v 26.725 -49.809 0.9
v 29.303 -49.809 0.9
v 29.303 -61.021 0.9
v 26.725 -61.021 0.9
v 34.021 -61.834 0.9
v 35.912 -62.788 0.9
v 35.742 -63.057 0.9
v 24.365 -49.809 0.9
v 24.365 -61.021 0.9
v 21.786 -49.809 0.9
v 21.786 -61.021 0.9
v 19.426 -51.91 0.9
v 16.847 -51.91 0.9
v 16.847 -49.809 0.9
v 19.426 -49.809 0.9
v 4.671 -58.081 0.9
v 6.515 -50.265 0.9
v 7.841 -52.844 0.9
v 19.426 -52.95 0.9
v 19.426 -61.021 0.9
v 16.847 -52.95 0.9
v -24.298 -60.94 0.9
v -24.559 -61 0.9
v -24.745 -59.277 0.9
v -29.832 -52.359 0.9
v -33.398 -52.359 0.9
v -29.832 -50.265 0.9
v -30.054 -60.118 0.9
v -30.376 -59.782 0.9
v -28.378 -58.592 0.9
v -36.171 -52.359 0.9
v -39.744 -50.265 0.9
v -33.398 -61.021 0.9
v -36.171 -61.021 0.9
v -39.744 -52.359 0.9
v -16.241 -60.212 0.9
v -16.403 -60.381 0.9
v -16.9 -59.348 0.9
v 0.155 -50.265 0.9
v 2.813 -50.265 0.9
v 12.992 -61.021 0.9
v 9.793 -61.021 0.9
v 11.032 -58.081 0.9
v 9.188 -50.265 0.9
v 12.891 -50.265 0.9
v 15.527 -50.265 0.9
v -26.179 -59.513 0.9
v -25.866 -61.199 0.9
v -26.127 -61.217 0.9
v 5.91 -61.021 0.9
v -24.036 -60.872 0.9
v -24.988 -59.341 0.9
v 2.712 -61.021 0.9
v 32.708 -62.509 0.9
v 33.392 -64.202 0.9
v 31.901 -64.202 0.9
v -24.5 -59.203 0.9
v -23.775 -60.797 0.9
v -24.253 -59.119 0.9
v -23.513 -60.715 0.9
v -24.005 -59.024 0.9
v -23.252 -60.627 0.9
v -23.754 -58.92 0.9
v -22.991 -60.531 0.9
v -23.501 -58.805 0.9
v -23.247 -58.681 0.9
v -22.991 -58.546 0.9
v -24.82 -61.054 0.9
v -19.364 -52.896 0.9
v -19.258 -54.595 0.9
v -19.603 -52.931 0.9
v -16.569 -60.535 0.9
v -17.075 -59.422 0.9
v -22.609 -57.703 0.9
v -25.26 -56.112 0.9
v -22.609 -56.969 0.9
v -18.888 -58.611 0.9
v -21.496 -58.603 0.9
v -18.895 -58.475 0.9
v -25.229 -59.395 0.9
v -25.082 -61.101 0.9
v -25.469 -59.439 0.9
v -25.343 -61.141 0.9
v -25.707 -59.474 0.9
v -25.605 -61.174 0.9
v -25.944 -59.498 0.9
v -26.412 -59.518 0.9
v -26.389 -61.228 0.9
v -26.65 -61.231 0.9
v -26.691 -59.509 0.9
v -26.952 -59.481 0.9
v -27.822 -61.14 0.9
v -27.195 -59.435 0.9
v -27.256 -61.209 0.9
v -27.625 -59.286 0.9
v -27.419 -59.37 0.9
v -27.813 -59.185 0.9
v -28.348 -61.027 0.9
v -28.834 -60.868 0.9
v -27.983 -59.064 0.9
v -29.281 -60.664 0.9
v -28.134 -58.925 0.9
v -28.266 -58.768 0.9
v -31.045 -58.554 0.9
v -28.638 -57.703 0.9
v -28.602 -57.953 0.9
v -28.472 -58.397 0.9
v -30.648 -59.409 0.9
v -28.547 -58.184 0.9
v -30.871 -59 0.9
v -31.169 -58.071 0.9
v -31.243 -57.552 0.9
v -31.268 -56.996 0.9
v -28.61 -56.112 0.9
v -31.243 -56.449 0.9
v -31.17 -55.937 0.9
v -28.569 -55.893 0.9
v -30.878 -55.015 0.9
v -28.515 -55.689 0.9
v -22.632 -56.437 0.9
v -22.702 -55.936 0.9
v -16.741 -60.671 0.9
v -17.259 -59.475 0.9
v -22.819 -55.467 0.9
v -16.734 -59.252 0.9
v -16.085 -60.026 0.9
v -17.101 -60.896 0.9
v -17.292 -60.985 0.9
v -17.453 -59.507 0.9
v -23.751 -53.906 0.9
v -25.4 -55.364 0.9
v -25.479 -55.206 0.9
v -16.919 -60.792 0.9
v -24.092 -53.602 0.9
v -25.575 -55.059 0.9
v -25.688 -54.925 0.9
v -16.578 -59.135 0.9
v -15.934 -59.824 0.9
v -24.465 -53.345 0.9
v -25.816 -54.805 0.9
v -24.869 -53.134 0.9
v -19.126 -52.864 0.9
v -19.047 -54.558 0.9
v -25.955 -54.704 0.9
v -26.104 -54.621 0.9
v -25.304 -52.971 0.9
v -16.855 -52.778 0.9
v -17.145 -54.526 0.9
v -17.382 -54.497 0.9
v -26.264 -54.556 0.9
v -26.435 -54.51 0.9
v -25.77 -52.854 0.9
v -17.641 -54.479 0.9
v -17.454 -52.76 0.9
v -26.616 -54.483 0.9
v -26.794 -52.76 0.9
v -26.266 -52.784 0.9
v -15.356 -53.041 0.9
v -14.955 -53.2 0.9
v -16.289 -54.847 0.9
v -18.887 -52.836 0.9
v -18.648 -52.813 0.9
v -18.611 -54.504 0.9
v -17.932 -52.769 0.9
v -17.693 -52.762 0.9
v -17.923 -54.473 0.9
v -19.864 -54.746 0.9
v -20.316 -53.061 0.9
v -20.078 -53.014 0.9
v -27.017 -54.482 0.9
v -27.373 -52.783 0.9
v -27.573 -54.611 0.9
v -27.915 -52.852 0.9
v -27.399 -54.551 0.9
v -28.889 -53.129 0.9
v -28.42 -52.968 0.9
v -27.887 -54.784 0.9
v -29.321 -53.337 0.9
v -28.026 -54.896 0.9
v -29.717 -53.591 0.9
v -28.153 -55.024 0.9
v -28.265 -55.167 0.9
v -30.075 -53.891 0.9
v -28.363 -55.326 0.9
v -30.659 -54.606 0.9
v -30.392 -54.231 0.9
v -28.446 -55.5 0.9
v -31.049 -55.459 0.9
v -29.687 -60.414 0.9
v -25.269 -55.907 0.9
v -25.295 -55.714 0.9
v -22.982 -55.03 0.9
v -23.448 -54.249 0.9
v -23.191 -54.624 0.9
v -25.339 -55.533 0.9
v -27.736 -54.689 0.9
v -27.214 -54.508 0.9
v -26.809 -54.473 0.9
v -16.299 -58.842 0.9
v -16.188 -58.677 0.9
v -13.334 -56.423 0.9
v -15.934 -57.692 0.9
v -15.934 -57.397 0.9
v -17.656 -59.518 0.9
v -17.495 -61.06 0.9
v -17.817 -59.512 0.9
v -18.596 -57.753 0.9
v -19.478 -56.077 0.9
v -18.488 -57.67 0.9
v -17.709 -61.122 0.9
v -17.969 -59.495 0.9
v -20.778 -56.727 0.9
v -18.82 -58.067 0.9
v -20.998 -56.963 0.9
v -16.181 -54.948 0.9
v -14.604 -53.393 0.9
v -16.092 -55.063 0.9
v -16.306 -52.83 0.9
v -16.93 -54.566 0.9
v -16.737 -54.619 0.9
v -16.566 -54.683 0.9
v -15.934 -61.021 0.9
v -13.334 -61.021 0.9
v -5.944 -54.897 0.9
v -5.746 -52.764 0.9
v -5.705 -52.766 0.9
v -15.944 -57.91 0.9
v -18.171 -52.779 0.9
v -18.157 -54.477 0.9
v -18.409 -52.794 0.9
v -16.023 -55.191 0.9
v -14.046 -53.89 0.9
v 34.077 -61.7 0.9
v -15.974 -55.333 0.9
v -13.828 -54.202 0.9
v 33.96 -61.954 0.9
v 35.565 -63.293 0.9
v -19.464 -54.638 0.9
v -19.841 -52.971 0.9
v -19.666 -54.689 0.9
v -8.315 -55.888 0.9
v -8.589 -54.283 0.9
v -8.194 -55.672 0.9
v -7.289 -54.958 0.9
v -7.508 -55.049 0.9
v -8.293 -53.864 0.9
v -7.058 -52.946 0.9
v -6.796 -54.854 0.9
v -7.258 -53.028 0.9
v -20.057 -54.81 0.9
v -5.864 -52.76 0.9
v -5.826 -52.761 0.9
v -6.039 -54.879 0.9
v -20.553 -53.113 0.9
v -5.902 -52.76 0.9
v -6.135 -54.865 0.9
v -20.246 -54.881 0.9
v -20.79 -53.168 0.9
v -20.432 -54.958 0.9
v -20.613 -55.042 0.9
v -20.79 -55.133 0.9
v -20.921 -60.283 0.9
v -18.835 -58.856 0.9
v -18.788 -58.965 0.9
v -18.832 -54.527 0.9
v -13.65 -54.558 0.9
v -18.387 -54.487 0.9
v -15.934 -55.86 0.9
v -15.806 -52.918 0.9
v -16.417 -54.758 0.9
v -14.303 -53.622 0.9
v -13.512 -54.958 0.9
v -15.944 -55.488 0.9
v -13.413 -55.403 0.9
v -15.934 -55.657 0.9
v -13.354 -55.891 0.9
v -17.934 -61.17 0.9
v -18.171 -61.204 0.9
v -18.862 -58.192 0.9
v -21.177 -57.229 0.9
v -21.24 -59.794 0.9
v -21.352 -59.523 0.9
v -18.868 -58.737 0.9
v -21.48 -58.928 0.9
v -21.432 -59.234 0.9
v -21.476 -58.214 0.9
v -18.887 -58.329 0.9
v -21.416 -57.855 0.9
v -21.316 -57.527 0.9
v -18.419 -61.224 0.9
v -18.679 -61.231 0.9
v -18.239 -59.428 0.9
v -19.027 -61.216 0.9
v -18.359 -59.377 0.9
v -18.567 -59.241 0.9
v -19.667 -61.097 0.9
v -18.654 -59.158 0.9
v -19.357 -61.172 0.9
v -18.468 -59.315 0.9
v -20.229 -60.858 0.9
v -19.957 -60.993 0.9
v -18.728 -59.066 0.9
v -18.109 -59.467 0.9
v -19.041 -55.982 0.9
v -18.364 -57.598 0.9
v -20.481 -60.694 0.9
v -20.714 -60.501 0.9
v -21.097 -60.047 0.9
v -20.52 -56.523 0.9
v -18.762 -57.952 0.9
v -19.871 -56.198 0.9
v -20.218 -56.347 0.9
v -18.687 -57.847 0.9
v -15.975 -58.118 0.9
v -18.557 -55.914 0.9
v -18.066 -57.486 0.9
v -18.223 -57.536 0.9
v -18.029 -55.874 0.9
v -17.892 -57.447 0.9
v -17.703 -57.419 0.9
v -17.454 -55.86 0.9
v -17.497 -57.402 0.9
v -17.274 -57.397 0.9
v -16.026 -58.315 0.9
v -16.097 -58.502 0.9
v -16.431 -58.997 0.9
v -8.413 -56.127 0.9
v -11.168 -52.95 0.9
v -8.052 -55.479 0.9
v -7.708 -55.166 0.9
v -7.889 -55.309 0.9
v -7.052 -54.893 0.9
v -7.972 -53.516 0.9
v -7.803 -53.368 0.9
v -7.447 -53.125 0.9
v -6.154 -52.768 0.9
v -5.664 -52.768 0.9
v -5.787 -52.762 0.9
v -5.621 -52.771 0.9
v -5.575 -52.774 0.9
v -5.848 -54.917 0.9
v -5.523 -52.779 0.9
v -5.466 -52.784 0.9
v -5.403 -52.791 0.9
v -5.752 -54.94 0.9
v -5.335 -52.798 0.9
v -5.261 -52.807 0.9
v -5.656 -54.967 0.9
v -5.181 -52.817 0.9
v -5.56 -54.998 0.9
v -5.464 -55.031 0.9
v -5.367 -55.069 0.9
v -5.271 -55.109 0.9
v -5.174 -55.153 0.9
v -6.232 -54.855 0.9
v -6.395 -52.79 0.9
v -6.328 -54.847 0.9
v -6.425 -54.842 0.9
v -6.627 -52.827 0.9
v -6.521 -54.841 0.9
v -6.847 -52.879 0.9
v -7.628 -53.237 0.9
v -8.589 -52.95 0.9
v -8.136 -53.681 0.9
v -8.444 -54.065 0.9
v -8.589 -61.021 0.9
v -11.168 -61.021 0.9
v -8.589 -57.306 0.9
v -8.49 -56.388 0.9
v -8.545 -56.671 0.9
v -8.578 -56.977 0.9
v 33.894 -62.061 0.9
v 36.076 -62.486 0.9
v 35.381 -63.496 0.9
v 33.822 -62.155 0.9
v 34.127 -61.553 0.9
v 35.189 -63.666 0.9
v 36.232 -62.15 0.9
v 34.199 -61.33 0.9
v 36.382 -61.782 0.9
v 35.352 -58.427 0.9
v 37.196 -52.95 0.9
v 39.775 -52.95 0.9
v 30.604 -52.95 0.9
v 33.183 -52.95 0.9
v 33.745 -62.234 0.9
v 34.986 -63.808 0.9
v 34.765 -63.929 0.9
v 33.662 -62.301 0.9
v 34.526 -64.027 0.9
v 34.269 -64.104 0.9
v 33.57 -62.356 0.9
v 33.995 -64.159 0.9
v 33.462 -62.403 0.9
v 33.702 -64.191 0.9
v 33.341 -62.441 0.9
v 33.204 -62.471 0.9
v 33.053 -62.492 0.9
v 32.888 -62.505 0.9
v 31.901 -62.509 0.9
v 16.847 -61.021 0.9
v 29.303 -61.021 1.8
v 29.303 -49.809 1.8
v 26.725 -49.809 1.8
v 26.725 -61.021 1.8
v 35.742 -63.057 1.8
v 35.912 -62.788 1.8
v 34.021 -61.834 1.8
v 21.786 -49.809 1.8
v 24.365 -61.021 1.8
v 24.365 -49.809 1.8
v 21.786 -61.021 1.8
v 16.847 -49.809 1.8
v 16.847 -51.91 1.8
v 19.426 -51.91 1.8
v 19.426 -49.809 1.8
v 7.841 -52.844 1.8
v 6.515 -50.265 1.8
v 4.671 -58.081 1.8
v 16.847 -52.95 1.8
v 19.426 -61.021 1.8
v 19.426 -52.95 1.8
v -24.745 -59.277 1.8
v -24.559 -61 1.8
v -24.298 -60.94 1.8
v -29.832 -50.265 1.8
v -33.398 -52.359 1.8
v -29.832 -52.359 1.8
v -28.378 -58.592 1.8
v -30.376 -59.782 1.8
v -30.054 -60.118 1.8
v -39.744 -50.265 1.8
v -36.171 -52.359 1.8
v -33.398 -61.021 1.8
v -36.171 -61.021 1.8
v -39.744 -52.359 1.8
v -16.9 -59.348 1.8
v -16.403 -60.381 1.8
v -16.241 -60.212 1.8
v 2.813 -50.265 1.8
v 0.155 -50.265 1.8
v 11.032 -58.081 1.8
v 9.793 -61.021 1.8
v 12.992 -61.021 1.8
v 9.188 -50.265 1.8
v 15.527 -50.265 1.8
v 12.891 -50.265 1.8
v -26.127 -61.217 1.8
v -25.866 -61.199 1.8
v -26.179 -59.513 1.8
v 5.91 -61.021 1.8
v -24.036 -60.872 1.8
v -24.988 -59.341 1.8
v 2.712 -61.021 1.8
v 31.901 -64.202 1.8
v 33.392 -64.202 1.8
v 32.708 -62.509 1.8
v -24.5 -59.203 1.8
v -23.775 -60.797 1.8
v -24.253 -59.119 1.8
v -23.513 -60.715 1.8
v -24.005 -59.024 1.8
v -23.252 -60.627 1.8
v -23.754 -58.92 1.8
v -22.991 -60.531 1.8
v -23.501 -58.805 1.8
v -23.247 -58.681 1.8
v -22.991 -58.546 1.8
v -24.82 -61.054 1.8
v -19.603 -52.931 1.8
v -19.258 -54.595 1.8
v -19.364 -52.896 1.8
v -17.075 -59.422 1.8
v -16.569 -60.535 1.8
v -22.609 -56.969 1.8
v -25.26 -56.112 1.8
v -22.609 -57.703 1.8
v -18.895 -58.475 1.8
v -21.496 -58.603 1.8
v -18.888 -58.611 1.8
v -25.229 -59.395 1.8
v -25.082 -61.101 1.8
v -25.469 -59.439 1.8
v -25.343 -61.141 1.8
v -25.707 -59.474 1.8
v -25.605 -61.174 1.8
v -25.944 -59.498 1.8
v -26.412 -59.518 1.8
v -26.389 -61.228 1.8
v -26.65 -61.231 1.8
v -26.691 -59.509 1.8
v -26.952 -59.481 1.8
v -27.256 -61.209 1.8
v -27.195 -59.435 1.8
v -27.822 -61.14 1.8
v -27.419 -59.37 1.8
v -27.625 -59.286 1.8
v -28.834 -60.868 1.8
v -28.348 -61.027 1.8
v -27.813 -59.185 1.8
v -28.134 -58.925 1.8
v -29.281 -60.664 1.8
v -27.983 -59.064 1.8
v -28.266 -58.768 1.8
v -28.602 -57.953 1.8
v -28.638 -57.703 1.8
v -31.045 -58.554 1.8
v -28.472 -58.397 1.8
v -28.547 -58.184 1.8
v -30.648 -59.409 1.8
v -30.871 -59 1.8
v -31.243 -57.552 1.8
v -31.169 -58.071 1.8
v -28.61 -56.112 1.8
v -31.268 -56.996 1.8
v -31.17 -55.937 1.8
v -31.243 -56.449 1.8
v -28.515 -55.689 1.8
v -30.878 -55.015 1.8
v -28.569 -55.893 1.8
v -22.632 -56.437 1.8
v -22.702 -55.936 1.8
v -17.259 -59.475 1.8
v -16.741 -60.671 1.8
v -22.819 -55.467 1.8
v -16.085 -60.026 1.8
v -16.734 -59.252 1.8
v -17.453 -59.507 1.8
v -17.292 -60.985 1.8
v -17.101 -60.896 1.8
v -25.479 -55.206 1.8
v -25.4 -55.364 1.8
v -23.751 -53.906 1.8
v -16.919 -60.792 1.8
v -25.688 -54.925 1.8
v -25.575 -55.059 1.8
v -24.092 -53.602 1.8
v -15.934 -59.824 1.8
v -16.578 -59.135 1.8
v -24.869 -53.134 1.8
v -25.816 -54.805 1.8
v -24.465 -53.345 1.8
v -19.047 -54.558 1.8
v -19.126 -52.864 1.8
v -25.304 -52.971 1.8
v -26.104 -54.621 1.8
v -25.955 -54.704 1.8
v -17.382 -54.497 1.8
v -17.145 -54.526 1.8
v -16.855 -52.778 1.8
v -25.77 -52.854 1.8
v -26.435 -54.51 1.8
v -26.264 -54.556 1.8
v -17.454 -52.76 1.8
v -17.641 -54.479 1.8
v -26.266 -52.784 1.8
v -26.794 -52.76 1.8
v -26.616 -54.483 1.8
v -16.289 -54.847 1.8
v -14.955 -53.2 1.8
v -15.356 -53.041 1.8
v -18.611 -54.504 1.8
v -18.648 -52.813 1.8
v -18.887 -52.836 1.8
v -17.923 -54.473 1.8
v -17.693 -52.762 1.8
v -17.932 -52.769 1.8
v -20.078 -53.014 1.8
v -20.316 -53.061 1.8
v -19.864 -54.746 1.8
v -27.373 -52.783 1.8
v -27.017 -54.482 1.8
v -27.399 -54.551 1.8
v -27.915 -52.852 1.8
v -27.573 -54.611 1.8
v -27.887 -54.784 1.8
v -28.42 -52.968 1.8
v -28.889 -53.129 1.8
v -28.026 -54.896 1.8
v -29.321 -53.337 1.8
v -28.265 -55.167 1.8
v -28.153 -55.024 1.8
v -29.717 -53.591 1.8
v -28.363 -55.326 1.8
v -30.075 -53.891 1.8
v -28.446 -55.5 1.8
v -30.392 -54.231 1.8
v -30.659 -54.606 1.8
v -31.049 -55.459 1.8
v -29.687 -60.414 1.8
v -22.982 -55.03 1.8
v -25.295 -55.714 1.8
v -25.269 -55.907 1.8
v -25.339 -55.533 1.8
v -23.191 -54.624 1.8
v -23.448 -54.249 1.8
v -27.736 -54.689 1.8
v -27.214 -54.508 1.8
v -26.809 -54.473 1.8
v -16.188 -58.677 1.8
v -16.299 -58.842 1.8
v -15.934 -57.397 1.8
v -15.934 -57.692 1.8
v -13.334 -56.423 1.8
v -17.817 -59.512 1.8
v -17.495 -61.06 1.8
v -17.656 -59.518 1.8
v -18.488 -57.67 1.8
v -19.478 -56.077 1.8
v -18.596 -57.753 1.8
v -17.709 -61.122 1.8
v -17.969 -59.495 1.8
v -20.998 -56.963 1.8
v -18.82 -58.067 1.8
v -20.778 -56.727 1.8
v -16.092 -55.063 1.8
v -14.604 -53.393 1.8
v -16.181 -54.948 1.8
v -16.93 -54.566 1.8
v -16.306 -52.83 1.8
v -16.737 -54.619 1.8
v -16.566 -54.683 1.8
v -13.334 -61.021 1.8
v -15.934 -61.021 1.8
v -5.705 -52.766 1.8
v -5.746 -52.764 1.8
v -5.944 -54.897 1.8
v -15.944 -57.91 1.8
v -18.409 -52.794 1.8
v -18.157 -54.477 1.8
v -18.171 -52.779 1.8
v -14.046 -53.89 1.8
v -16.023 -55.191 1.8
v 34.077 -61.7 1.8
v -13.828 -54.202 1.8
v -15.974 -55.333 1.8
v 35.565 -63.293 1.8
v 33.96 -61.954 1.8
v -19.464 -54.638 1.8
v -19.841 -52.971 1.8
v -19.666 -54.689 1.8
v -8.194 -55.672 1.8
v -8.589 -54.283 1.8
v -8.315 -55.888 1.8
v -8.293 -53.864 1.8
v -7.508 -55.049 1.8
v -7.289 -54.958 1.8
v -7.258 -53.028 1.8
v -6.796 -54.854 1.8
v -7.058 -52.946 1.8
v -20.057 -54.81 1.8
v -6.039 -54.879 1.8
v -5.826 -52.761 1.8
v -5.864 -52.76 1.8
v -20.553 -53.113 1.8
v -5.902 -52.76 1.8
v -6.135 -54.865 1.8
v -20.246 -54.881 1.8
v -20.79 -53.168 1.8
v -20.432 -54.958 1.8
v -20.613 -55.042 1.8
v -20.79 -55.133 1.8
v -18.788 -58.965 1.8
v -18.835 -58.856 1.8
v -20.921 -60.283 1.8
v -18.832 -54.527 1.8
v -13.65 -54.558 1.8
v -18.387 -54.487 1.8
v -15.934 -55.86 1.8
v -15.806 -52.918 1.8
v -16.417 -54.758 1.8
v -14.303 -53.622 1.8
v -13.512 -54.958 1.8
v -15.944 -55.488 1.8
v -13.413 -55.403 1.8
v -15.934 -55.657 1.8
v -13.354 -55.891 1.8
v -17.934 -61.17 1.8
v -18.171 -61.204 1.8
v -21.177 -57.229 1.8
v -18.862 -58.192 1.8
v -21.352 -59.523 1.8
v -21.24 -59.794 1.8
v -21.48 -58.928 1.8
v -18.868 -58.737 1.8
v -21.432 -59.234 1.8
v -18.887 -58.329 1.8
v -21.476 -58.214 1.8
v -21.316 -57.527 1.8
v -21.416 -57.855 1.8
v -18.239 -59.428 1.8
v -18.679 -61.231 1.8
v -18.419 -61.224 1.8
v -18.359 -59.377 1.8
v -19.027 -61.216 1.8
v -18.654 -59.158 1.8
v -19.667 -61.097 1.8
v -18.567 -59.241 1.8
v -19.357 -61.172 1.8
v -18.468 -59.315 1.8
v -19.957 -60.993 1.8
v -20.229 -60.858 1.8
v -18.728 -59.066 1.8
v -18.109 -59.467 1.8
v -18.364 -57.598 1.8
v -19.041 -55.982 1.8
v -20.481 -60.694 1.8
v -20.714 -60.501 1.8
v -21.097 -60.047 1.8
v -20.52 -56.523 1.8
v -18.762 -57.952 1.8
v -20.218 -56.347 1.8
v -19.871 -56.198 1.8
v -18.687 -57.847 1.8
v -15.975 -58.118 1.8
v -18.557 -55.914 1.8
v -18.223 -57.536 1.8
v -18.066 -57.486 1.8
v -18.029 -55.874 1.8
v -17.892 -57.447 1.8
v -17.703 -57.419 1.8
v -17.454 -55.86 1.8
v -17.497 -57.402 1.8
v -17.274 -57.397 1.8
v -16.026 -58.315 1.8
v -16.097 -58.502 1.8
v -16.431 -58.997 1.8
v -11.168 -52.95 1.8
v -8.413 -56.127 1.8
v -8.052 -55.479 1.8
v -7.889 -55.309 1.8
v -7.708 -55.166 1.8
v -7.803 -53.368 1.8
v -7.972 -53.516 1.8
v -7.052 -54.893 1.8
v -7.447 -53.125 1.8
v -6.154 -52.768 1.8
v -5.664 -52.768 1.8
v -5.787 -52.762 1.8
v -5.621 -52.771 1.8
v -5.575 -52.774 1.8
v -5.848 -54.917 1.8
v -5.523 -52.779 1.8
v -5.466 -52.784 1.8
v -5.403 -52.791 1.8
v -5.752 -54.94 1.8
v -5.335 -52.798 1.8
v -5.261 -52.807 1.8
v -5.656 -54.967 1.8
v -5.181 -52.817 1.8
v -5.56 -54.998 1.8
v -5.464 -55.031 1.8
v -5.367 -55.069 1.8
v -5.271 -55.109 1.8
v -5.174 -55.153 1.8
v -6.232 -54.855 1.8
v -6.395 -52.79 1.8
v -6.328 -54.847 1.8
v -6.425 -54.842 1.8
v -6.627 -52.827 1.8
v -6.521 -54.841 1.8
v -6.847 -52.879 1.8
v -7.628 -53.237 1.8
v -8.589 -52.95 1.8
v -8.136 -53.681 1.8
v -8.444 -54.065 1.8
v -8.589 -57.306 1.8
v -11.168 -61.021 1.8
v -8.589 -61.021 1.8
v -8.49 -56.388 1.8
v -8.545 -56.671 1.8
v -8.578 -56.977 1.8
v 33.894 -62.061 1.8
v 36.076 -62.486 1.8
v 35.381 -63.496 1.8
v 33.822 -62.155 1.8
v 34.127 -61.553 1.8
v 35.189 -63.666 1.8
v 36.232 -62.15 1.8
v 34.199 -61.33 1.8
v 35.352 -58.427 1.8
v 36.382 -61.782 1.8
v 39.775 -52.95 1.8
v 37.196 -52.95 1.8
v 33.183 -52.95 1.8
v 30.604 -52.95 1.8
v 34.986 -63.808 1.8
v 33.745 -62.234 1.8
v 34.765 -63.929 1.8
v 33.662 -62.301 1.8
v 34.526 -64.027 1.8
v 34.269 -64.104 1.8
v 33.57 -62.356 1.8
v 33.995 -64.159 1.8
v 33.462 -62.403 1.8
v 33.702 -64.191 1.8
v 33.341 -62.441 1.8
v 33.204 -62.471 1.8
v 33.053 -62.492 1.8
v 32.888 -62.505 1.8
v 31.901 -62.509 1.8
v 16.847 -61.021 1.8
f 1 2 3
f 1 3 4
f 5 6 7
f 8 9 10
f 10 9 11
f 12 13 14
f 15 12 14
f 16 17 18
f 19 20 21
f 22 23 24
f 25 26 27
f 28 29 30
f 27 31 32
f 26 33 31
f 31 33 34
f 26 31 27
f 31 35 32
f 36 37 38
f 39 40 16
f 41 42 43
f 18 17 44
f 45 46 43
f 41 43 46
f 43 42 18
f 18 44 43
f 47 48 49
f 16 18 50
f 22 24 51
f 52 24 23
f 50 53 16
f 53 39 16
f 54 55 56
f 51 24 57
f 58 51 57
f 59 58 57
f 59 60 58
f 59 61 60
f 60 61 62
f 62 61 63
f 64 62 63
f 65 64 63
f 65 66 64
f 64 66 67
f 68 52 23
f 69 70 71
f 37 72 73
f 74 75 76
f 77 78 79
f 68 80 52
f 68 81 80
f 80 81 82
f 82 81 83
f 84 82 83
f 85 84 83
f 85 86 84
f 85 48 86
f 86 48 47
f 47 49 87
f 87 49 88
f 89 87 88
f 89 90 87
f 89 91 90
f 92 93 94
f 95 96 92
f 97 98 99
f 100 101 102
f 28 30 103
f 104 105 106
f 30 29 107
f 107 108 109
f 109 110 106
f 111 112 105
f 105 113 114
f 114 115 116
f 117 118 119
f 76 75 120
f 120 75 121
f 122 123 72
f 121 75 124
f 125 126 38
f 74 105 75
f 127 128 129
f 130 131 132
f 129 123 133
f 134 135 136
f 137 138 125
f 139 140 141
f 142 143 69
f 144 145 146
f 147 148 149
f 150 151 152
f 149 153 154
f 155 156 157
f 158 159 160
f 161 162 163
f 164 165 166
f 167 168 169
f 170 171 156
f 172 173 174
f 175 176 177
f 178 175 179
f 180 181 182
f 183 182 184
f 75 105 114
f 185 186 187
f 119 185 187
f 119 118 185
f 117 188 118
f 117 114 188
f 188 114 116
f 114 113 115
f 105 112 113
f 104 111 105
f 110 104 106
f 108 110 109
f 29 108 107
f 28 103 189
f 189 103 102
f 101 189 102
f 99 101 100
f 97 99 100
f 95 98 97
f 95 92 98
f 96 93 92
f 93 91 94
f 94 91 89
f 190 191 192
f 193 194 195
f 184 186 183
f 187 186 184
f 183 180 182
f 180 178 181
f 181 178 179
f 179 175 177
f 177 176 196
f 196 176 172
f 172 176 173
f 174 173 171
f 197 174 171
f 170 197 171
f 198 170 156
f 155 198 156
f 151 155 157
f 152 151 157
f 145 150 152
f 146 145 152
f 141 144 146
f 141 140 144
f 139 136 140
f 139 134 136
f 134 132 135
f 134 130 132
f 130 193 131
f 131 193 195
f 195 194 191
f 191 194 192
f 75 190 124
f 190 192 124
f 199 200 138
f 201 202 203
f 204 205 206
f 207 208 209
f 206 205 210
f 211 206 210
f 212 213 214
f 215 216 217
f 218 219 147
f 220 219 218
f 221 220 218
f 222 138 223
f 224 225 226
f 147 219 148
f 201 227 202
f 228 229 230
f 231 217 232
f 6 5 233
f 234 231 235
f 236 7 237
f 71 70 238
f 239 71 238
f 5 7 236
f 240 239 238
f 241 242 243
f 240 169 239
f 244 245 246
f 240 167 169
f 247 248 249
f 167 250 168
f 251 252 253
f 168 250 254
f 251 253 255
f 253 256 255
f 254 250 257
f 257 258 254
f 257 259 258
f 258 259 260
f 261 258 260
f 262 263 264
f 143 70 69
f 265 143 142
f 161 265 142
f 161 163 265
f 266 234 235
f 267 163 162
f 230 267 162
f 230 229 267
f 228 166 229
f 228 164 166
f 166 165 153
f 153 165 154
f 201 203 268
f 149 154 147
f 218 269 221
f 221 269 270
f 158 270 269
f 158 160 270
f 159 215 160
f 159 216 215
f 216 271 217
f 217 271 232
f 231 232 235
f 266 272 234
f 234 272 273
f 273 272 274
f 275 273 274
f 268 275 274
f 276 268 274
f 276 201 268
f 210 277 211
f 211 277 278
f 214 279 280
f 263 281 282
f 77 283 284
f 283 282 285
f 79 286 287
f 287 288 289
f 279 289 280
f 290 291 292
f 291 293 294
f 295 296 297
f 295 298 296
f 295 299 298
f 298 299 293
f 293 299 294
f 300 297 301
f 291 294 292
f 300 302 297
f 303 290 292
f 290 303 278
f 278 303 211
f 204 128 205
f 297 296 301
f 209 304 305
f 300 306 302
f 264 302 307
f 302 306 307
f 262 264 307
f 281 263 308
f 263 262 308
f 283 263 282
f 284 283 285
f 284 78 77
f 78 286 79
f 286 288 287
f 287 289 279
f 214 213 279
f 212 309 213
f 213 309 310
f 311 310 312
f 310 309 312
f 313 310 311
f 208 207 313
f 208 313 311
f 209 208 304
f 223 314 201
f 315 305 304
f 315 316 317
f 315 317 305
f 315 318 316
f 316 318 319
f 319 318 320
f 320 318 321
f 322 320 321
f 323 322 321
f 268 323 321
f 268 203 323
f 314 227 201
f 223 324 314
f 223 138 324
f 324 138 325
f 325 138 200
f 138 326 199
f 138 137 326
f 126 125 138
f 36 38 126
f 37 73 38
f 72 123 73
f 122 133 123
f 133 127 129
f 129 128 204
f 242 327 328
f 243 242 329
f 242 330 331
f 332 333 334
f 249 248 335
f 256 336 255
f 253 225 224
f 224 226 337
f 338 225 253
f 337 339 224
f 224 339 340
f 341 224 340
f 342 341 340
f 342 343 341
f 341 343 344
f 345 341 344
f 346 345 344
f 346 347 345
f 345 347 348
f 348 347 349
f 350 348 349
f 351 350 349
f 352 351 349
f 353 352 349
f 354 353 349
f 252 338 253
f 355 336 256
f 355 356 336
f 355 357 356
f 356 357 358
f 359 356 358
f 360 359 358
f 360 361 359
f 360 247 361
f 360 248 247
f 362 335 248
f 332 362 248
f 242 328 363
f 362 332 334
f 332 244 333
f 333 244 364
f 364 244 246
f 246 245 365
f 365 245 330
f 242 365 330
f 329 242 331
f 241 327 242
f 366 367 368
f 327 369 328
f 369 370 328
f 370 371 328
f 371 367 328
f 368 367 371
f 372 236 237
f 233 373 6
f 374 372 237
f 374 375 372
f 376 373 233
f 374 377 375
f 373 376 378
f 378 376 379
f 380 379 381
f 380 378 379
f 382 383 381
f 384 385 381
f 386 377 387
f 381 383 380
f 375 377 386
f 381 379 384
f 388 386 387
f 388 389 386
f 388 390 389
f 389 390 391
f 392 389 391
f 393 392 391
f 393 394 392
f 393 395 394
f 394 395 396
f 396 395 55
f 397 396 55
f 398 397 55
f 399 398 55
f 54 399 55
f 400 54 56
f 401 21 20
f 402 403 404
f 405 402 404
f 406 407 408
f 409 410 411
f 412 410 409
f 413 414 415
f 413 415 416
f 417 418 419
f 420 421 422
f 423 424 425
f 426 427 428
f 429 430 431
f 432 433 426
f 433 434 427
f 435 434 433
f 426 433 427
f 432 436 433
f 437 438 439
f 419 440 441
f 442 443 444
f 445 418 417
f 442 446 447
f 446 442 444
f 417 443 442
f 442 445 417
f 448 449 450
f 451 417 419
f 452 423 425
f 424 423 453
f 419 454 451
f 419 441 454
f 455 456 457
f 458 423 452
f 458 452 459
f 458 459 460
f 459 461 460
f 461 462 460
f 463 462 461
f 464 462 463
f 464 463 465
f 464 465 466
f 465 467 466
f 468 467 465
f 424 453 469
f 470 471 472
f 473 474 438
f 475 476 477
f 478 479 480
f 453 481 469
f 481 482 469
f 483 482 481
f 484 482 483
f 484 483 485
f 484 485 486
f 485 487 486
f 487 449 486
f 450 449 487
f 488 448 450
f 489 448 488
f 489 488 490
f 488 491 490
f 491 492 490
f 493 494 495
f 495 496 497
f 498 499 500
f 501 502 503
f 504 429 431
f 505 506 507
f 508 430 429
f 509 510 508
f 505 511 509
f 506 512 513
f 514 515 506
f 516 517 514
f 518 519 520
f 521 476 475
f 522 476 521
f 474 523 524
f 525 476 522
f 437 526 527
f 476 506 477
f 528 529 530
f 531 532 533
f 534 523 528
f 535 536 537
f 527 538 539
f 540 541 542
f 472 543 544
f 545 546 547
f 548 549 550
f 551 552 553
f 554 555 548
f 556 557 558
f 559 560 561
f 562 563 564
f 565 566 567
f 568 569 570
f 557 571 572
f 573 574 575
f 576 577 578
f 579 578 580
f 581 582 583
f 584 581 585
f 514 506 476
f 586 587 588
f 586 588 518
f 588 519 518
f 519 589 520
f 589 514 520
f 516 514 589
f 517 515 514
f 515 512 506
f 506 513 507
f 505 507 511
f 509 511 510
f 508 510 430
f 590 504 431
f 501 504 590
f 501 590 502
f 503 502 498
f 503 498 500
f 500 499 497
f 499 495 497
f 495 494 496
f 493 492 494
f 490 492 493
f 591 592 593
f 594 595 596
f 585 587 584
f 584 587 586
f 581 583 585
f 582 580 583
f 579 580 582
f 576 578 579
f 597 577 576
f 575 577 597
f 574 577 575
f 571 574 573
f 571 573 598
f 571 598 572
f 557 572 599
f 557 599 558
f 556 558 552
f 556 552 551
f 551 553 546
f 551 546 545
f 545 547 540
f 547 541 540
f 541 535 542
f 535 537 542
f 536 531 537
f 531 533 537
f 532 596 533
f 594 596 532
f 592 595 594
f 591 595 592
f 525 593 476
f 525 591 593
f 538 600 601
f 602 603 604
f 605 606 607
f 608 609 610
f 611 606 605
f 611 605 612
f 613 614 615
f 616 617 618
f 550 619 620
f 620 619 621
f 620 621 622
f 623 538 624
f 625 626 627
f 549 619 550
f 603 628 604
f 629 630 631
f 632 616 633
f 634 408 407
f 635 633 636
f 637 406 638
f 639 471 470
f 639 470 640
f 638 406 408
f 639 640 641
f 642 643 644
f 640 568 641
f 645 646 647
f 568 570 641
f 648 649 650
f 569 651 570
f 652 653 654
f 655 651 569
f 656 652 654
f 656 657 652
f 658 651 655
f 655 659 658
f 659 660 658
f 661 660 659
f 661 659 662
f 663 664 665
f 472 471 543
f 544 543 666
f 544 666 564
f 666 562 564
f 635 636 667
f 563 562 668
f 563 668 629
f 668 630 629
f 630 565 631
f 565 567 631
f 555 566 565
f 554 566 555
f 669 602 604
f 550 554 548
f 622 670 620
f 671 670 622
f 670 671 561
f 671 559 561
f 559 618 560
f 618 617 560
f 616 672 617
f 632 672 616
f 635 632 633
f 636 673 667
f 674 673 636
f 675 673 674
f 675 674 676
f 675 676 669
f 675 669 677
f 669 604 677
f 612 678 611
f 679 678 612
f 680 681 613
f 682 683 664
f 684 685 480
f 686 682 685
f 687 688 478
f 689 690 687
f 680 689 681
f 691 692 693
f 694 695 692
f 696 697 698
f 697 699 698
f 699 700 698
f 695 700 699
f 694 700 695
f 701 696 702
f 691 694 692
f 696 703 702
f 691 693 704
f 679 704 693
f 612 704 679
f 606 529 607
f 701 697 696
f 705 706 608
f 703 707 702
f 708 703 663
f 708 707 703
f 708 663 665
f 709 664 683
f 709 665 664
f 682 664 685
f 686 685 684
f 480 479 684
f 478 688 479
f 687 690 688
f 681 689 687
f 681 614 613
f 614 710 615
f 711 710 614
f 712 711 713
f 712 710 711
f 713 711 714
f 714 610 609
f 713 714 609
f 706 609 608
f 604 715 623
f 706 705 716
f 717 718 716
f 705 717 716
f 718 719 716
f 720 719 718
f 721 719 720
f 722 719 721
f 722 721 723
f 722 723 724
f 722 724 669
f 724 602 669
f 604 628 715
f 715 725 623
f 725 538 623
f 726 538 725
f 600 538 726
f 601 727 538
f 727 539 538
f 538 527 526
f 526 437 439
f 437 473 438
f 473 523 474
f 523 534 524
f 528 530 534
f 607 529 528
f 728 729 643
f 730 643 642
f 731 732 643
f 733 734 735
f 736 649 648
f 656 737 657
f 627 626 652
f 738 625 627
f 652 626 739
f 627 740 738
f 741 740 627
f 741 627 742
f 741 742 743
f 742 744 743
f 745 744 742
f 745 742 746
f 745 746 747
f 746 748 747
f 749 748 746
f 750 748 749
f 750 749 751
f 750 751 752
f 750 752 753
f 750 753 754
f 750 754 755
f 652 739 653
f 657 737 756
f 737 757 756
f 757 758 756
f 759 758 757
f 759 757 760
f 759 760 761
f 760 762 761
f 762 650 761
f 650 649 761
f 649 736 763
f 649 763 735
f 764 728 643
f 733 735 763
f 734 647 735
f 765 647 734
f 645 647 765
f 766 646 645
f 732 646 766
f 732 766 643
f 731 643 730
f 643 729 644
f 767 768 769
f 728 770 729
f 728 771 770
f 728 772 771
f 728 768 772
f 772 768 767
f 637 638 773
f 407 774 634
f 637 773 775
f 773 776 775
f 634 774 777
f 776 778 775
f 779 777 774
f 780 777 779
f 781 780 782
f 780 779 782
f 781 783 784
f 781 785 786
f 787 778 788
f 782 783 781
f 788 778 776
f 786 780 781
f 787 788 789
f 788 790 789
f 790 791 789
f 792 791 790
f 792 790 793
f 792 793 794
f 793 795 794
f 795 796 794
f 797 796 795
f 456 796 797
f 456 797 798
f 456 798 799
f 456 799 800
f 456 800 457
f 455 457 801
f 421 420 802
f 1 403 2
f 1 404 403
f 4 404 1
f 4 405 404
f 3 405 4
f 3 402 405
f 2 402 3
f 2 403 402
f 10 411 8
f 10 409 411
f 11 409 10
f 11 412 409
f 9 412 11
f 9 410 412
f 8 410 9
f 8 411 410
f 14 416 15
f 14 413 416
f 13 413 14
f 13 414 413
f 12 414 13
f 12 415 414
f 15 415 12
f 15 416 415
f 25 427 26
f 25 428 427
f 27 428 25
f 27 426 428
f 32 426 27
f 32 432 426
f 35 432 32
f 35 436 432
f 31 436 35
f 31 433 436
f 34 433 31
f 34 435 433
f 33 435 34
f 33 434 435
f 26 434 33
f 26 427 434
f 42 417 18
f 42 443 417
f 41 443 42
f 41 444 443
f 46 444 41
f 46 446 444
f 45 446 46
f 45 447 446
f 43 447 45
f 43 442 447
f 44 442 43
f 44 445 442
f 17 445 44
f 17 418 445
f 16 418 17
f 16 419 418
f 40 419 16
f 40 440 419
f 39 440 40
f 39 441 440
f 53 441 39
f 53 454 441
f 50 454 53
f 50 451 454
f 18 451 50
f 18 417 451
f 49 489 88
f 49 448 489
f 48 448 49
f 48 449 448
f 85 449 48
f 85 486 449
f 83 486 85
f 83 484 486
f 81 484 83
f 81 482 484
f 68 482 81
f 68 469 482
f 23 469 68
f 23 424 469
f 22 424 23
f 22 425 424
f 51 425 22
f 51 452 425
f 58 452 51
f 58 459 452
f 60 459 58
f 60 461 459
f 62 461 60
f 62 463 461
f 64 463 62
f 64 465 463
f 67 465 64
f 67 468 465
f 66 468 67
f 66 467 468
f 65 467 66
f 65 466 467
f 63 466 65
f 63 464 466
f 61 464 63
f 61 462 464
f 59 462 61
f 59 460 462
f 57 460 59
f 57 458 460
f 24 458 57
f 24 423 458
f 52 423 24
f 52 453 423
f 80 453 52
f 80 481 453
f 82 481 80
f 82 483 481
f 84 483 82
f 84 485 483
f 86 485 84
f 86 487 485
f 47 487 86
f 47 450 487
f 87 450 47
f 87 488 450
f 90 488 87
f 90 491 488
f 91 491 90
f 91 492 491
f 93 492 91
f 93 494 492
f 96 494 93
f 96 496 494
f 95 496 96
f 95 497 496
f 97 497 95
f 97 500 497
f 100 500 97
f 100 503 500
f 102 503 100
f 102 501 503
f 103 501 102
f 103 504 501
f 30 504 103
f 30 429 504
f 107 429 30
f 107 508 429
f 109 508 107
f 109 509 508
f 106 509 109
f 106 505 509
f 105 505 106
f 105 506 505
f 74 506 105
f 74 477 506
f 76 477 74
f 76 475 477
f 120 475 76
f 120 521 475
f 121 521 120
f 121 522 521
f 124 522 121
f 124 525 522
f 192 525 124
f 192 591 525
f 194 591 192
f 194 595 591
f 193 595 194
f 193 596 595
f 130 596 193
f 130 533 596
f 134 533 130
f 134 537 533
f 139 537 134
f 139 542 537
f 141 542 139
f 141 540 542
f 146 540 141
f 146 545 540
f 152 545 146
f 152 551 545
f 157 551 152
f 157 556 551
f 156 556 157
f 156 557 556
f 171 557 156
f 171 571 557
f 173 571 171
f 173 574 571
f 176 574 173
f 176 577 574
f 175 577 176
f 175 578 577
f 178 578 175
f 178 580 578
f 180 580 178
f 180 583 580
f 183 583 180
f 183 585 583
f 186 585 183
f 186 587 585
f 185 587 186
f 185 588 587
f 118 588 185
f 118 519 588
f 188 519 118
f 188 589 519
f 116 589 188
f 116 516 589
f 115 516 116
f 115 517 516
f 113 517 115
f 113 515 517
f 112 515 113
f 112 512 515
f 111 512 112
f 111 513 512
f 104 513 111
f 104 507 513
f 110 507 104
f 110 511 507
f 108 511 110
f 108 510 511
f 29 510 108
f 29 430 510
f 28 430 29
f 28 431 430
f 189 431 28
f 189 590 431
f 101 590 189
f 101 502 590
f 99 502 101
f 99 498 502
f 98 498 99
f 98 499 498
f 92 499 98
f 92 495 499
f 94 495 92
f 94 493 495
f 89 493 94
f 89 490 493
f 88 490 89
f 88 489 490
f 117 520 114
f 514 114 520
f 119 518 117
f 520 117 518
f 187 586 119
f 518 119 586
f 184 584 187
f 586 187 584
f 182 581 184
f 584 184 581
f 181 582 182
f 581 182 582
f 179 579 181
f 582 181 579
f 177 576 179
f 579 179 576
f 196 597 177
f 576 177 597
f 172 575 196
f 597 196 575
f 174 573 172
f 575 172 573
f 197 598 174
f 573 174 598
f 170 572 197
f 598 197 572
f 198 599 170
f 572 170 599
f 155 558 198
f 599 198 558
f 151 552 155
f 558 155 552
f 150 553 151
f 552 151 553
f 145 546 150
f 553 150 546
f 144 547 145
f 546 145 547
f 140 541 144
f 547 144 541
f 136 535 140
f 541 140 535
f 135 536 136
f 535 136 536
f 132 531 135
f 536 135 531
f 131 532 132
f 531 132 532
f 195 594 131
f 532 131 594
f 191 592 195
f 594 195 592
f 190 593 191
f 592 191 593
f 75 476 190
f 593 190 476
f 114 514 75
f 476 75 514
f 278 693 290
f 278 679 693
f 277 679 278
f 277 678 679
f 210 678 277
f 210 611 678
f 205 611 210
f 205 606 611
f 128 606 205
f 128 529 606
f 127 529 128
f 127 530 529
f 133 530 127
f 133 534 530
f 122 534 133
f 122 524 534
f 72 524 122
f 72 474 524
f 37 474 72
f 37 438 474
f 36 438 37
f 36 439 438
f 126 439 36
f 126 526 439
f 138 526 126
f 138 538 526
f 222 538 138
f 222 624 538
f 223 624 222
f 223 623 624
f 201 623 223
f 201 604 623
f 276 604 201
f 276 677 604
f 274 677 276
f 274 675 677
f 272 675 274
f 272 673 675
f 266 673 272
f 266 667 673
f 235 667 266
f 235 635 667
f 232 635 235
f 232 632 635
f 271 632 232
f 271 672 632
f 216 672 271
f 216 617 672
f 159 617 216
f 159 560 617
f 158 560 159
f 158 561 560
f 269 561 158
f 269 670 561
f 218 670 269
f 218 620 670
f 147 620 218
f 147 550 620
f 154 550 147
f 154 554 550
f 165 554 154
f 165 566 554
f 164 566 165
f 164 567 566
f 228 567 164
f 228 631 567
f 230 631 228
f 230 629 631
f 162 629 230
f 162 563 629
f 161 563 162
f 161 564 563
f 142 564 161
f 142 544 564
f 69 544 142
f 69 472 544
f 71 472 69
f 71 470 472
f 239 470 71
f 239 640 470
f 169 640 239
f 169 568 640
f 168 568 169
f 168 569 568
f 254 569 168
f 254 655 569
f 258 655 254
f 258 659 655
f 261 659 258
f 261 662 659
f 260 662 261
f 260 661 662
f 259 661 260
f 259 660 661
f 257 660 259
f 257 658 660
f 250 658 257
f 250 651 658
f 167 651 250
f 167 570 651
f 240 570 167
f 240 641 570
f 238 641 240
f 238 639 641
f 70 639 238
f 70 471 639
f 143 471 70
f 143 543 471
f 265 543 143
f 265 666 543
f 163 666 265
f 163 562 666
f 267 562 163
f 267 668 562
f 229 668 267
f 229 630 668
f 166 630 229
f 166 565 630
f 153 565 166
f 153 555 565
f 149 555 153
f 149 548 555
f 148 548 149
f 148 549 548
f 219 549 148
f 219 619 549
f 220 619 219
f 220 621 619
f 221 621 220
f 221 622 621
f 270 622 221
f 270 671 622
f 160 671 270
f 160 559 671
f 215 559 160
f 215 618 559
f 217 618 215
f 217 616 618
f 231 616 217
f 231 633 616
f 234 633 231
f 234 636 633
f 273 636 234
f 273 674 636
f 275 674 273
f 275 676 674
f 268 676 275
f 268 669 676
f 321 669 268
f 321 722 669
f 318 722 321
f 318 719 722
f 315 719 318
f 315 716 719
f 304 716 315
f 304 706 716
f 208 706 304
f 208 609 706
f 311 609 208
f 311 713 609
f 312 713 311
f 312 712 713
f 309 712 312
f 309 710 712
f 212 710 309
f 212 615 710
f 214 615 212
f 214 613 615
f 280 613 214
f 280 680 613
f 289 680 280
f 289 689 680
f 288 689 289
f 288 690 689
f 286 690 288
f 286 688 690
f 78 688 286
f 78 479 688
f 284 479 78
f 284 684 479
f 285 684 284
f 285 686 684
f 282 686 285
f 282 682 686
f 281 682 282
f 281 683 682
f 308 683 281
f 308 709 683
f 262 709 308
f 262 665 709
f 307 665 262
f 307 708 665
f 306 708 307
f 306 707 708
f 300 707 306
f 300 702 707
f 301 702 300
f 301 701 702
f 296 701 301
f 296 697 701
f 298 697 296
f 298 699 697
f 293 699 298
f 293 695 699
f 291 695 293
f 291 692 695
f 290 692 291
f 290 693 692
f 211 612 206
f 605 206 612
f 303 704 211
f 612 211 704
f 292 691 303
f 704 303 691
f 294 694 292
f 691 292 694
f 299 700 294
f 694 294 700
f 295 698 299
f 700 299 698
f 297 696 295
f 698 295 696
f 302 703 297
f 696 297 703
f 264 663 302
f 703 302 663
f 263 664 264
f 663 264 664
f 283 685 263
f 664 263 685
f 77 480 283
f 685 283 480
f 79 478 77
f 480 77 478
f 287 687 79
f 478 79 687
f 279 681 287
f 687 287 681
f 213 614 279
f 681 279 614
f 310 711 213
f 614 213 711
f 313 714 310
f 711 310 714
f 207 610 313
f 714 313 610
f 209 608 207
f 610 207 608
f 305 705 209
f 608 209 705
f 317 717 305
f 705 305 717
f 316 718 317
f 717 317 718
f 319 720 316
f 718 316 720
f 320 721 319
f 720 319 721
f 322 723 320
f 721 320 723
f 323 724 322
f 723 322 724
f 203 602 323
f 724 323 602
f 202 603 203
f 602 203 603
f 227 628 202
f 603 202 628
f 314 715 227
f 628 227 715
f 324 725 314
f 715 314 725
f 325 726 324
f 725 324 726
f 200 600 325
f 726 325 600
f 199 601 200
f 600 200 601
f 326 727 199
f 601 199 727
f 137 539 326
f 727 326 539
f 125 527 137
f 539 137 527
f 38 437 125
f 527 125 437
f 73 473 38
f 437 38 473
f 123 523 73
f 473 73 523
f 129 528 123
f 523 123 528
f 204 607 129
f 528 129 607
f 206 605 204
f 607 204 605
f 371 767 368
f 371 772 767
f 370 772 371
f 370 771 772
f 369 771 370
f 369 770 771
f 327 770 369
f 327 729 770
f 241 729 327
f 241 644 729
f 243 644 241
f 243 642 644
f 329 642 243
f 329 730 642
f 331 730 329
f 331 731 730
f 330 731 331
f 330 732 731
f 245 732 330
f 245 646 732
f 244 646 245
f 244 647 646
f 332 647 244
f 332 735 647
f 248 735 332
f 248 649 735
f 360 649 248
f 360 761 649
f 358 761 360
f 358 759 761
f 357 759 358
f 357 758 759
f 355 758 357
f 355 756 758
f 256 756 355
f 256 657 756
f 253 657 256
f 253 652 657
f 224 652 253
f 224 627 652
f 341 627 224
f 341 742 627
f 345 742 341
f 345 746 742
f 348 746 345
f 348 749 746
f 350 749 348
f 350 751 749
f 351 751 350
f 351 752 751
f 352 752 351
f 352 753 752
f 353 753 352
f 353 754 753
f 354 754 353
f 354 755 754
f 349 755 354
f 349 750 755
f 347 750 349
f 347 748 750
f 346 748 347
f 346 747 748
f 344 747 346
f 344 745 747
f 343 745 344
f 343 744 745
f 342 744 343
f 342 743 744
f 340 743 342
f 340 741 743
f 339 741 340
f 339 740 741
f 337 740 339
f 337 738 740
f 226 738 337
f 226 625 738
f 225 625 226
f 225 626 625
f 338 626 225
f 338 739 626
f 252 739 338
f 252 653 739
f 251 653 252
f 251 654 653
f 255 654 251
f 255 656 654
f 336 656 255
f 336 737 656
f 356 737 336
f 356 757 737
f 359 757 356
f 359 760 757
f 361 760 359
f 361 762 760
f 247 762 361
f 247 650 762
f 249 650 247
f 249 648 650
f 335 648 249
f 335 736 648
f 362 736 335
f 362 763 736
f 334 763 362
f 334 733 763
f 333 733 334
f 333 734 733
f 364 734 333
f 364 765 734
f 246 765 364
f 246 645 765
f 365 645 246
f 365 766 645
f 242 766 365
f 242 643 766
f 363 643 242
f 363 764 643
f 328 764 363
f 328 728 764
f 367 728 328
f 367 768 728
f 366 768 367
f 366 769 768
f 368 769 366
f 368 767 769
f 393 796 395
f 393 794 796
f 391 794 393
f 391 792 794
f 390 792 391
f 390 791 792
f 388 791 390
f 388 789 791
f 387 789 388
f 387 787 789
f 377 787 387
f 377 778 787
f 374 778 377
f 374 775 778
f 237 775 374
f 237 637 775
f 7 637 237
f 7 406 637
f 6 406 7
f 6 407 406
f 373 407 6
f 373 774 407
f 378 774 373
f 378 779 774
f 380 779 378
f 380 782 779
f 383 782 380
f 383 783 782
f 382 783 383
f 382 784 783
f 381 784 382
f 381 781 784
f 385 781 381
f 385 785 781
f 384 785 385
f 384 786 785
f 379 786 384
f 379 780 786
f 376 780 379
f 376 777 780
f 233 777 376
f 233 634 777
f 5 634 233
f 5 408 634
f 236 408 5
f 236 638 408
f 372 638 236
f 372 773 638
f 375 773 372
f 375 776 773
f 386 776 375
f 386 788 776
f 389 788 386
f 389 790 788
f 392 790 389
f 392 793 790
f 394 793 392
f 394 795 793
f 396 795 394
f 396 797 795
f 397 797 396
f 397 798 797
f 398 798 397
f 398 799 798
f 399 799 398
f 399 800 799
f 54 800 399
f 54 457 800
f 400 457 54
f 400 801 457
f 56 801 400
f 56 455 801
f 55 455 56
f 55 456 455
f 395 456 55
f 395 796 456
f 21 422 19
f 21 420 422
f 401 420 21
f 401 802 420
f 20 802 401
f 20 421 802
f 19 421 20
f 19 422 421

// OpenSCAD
$fn = 48;
  // English (below bottom hole)
  translate([0, -57.100, 0.900]) linear_extrude(height=0.900) text("Tear Willy", size=10.623, halign="center", valign="center", font="Helvetica Neue:style=Bold");
